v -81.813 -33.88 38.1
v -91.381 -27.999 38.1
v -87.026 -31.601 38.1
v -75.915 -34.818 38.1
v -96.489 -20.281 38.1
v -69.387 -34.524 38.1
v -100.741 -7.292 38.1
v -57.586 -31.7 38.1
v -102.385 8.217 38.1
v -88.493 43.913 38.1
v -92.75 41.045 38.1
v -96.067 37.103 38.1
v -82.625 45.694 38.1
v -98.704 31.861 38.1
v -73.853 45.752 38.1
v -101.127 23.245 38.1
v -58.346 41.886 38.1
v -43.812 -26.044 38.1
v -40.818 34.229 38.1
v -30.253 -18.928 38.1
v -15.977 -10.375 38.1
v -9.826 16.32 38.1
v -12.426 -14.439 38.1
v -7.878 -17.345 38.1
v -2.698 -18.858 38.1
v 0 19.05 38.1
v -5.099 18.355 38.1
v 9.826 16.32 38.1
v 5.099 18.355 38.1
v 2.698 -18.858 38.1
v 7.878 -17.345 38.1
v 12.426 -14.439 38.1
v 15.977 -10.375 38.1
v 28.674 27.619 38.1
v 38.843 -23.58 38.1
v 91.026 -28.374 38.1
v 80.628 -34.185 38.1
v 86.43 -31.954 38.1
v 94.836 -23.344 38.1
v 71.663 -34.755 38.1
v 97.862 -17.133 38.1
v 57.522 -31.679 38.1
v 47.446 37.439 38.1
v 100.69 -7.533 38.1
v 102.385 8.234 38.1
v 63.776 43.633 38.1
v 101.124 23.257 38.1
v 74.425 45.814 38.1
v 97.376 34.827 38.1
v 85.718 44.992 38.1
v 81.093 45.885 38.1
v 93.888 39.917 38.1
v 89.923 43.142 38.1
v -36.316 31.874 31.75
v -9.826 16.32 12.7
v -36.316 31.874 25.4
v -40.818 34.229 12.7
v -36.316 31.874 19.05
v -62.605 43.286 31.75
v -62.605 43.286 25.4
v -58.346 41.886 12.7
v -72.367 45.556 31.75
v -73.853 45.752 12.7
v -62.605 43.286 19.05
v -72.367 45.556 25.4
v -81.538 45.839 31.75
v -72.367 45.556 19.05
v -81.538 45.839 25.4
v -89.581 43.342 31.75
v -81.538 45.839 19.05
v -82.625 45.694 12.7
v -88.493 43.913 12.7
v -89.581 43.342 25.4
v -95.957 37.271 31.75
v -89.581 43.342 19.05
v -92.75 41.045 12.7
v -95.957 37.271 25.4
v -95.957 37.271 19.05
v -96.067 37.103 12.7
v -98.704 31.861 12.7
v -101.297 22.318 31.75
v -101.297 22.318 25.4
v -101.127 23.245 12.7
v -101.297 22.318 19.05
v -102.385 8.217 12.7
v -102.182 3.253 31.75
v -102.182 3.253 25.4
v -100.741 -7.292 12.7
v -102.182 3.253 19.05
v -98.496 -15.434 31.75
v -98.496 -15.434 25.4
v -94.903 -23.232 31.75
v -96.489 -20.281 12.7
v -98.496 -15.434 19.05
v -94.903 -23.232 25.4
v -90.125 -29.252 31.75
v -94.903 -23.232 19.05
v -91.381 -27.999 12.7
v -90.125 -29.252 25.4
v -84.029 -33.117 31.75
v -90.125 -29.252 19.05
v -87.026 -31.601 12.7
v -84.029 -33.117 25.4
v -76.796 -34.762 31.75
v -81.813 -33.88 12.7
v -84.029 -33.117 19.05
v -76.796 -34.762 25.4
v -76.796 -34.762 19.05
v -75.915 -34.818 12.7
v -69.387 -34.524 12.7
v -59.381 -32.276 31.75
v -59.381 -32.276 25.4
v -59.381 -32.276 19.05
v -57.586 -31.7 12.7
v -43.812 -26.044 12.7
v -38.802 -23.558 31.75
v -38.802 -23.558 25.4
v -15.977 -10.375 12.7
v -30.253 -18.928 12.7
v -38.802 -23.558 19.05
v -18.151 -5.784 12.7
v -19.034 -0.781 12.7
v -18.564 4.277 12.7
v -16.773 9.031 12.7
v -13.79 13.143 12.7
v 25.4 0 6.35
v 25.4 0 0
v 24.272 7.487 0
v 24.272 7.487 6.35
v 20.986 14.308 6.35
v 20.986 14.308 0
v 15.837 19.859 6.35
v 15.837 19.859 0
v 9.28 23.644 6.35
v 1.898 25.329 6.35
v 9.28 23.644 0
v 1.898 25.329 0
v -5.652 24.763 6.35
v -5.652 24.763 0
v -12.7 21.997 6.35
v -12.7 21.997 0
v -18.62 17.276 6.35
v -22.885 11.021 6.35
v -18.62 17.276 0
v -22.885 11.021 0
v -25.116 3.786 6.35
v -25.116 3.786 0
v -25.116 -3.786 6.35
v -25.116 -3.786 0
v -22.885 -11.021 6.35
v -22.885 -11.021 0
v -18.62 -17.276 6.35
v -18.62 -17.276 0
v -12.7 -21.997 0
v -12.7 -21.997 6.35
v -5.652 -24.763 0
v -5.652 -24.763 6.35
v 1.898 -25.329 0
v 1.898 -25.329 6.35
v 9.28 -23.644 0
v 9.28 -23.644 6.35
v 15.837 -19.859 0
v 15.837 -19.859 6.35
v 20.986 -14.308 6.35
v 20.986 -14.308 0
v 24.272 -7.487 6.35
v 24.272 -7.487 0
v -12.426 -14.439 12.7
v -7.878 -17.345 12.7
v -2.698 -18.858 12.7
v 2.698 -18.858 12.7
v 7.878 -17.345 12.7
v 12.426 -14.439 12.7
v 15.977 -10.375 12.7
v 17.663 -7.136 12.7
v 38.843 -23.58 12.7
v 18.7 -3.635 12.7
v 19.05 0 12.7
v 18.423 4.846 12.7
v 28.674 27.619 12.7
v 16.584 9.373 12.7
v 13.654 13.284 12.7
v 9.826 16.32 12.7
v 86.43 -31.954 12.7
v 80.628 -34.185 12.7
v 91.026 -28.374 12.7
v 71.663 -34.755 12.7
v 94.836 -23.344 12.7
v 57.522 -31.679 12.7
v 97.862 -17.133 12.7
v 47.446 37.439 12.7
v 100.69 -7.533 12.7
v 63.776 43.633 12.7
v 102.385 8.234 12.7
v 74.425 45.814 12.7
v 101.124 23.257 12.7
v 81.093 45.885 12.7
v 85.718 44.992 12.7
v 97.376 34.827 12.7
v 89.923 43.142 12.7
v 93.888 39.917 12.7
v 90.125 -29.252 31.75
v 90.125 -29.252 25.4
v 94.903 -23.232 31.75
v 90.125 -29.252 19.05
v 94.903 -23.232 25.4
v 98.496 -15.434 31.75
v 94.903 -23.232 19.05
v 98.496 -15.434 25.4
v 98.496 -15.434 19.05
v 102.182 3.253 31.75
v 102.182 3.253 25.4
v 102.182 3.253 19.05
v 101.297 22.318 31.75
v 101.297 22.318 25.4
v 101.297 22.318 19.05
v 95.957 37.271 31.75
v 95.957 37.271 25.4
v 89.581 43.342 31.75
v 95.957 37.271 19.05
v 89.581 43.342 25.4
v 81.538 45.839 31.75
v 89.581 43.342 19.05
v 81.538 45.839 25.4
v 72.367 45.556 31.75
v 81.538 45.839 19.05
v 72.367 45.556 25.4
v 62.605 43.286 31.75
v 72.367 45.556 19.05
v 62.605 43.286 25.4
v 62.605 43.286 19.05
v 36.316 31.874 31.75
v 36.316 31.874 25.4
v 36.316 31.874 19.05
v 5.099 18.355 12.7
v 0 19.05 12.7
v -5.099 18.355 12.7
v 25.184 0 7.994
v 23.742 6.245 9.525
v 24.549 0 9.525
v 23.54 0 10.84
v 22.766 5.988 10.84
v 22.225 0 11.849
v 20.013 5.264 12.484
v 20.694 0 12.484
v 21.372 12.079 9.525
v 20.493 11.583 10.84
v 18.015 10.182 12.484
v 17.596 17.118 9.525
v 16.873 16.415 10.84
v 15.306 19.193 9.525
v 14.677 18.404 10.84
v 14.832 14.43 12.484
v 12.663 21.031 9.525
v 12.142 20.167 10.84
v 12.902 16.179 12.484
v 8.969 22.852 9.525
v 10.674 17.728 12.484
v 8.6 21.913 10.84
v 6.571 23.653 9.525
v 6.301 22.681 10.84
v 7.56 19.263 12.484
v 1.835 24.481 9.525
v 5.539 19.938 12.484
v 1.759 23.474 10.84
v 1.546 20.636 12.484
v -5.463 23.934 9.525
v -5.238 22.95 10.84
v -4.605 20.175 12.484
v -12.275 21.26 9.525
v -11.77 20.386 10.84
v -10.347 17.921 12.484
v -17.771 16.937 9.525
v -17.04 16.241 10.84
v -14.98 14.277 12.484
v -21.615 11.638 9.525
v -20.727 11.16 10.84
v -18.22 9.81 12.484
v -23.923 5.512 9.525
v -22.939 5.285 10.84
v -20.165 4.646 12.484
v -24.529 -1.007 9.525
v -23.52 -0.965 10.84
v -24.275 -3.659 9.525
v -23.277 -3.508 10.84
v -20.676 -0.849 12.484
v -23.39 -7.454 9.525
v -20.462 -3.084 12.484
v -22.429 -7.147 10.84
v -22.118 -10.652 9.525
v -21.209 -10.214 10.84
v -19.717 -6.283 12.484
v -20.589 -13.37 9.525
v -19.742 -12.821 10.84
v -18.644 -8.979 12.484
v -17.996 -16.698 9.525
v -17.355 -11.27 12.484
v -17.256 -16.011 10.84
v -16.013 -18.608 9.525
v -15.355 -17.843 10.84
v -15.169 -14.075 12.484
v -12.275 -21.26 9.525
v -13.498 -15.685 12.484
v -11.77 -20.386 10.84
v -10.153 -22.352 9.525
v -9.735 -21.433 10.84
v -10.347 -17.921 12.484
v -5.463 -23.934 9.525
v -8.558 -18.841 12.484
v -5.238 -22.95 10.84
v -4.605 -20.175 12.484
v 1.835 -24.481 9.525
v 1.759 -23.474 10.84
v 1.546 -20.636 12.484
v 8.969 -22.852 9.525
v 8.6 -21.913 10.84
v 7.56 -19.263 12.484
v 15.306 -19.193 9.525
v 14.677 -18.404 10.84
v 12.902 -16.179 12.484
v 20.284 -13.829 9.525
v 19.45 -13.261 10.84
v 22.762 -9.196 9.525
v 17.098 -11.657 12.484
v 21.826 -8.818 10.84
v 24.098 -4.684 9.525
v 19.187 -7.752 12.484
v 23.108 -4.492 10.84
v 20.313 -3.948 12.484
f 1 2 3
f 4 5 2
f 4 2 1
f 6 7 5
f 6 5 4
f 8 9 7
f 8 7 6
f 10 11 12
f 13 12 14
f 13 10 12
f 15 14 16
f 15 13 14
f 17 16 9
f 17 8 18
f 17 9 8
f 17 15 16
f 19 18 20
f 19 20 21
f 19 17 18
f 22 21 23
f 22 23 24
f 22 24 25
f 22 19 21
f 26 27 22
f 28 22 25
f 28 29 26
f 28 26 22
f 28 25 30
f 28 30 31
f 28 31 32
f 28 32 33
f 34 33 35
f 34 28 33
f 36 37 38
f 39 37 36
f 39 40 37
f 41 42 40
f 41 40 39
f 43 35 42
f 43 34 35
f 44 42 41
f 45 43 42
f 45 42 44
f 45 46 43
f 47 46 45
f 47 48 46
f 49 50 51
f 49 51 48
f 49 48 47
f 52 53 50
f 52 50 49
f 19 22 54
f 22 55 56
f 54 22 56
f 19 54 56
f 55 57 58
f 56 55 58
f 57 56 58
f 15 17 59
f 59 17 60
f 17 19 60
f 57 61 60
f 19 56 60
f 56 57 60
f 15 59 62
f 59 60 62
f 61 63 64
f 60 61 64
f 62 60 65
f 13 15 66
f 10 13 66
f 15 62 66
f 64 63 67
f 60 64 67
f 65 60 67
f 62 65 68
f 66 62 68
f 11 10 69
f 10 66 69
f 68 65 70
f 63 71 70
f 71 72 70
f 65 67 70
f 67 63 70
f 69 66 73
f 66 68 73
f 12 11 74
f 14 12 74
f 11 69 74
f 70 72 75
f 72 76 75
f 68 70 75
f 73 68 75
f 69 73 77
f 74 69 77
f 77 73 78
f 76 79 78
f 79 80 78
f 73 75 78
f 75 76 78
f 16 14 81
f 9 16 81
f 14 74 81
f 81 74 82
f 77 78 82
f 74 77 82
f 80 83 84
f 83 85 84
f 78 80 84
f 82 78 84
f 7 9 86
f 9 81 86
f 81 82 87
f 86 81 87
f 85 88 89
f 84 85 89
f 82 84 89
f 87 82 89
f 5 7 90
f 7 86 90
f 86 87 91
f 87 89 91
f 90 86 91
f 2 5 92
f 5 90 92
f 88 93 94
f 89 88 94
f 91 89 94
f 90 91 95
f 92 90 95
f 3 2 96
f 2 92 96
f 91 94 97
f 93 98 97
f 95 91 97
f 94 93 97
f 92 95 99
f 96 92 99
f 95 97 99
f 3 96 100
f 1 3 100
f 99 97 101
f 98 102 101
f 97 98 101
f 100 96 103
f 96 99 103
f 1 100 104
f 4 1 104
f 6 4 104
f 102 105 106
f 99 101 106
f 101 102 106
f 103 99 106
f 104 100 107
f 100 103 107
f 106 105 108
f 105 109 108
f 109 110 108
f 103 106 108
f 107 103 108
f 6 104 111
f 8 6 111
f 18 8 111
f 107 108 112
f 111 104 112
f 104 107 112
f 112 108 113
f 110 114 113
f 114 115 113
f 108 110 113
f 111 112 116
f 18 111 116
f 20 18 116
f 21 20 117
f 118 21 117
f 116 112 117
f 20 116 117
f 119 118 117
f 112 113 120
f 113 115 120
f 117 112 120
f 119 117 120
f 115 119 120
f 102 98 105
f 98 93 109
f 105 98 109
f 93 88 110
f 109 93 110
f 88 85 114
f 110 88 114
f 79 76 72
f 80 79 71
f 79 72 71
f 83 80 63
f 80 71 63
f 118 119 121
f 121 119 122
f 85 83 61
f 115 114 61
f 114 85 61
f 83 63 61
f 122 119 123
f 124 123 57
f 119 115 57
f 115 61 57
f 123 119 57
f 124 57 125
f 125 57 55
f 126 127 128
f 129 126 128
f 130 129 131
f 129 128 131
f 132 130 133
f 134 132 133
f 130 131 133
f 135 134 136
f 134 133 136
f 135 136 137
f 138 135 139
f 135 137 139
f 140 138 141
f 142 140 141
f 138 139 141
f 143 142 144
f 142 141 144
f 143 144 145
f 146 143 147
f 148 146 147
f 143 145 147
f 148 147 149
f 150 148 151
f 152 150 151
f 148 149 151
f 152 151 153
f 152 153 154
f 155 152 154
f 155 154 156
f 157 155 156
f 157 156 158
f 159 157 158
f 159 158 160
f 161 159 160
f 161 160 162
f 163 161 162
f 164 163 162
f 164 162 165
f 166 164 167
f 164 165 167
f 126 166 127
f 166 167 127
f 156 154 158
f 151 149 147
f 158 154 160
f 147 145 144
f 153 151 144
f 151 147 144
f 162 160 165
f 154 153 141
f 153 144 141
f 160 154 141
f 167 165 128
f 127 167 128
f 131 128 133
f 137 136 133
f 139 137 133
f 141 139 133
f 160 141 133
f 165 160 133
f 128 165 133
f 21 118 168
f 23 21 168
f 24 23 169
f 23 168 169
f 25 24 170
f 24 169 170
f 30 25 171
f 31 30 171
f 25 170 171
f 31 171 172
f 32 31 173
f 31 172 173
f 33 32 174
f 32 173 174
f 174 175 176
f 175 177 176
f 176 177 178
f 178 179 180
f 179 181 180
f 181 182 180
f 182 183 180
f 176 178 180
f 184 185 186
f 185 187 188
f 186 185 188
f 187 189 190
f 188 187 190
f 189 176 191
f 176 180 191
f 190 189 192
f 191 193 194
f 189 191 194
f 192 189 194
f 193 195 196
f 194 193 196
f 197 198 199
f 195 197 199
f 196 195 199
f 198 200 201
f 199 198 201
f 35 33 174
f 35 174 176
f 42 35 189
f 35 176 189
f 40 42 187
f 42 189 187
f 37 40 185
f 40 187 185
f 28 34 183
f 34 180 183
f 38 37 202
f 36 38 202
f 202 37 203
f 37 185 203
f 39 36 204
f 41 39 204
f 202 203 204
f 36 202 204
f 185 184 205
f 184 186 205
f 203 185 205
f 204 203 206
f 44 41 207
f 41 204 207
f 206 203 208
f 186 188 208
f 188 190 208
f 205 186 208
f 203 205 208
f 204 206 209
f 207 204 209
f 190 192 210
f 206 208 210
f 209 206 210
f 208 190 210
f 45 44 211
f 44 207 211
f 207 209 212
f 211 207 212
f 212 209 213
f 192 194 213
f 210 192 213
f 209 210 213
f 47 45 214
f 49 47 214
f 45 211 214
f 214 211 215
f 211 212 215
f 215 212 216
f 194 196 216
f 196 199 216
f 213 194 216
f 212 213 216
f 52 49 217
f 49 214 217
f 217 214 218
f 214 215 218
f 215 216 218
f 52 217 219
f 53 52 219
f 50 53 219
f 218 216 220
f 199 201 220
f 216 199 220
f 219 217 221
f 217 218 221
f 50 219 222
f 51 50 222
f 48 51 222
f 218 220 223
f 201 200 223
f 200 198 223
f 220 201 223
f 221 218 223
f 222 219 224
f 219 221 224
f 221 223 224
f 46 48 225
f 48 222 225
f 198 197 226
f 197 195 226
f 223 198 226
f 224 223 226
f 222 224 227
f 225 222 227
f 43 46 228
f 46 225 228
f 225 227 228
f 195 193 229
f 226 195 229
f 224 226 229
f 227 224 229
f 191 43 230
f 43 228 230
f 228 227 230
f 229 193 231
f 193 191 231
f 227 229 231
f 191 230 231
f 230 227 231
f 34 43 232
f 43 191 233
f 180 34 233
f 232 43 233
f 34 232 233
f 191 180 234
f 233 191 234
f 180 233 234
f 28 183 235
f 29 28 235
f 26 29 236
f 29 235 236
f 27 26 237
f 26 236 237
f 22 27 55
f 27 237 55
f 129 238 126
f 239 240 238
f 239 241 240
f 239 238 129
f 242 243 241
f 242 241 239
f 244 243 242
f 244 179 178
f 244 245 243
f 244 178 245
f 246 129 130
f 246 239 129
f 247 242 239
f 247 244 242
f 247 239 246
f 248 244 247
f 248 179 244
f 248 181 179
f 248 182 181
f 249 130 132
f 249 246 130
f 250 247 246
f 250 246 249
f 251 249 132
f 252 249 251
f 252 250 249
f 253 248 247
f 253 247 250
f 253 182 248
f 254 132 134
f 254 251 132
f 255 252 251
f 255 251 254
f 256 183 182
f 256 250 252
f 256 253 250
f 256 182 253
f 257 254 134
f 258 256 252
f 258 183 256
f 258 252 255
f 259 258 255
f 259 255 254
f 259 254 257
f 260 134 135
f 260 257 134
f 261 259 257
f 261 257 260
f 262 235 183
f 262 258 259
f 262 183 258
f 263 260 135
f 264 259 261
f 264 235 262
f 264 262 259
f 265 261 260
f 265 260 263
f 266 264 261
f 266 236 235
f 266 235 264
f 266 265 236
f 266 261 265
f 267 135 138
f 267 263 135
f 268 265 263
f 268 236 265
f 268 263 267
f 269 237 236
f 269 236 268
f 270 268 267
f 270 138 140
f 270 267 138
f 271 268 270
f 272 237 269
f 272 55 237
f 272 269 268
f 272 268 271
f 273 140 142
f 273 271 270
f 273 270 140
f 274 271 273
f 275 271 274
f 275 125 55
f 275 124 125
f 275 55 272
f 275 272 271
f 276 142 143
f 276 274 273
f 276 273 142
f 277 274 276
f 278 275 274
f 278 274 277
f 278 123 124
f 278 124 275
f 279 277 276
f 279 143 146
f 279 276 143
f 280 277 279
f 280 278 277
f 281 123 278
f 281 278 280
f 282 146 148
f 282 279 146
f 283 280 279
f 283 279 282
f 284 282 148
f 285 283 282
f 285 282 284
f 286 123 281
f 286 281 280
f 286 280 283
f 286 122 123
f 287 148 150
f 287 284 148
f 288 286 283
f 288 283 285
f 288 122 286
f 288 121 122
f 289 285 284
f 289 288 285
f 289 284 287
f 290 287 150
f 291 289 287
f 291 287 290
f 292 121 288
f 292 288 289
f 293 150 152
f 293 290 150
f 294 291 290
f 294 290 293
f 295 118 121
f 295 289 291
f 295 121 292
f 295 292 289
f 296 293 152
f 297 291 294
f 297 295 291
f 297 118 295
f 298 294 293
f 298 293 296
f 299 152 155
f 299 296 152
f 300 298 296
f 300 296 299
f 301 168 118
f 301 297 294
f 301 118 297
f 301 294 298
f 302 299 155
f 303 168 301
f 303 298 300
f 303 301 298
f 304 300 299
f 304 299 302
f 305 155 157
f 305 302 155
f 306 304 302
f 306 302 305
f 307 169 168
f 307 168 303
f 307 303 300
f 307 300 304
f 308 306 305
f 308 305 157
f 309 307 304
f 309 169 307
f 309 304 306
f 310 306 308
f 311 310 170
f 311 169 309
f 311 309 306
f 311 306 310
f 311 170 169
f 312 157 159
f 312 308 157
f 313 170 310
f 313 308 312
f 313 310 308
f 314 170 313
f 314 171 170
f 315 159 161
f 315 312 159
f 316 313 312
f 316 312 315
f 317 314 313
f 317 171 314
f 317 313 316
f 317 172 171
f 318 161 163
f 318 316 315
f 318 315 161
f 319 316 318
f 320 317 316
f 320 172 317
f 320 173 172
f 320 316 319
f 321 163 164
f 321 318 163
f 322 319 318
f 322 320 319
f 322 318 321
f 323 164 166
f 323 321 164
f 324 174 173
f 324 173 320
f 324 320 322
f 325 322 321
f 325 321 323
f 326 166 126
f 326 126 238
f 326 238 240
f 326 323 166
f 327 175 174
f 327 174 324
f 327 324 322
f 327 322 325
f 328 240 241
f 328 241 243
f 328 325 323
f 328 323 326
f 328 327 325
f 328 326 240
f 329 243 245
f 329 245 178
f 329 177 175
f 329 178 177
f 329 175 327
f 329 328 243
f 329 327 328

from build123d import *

# Parameters (mm, degrees)
F0_R     = 25.4
F1_DEPTH = 12.7
F2_R     = 6.35
F4_DEPTH = 25.4


with BuildPart() as f1:
    # F0 (on Top) → F1 (new body)
    with BuildSketch(Plane.XY):
        Circle(F0_R)
    extrude(amount=F1_DEPTH)

    # F2
    f2_edges = [f1.edges().sort_by_distance(p)[0] for p in [
        (-25.4, 0, 12.7),
    ]]
    fillet(f2_edges, radius=F2_R)

    # F3 (on face) → F4 (join)
    with BuildSketch(Plane.XY.offset(12.7)):
        with BuildLine():
            ThreePointArc((15.9767099151, -10.3753188042), (18.2655252304, -5.4104609839), (19.05, 0))
            ThreePointArc((19.05, 0), (16.5844776781, 9.3732385089), (9.8261049717, 16.3202377766))
            ThreePointArc((9.8261049717, 16.3202377766), (0, 19.05), (-9.8261049717, 16.3202377766))
            ThreePointArc((-9.8261049717, 16.3202377766), (-18.5636607195, 4.2770317616), (-15.9767099151, -10.3753188042))
            add(Edge.make_bspline(
                [(-15.9767099151, -10.3753188042), (-10.733833245, -7.0871349658), (-5.3932086394, -3.5998040782), (0, 0)],
                knots=[0.9558270174, 0.9558270174, 0.9558270174, 0.9558270174, 1, 1, 1, 1], degree=3))
            add(Edge.make_bspline(
                [(15.9767099151, -10.3753188042), (10.733833245, -7.0871349658), (5.3932086394, -3.5998040782), (0, 0)],
                knots=[0.9558270174, 0.9558270174, 0.9558270174, 0.9558270174, 1, 1, 1, 1], degree=3))
        make_face()
        with BuildLine():
            ThreePointArc((9.8261049717, 16.3202377766), (16.5844776781, 9.3732385089), (19.05, 0))
            ThreePointArc((19.05, 0), (18.2655252304, -5.4104609839), (15.9767099151, -10.3753188042))
            add(Edge.make_bspline(
                [(9.8261049717, 16.3202377766), (27.5133129115, 27.1332712353), (58.5484608841, 46.2094911101), (107.0925459928, 49.2422955372), (102.8890607811, -55.0234025928), (47.4976243758, -30.1443440976), (15.9767099151, -10.3753188042)],
                knots=[0, 0, 0, 0, 0.2449740985, 0.4302204371, 0.6902528121, 0.9558270174, 0.9558270174, 0.9558270174, 0.9558270174], degree=3))
        make_face()
        with BuildLine():
            ThreePointArc((-15.9767099151, -10.3753188042), (0, -19.05), (15.9767099151, -10.3753188042))
            add(Edge.make_bspline(
                [(15.9767099151, -10.3753188042), (10.733833245, -7.0871349658), (5.3932086394, -3.5998040782), (0, 0)],
                knots=[0.9558270174, 0.9558270174, 0.9558270174, 0.9558270174, 1, 1, 1, 1], degree=3))
            add(Edge.make_bspline(
                [(-15.9767099151, -10.3753188042), (-10.733833245, -7.0871349658), (-5.3932086394, -3.5998040782), (0, 0)],
                knots=[0.9558270174, 0.9558270174, 0.9558270174, 0.9558270174, 1, 1, 1, 1], degree=3))
        make_face()
        with BuildLine():
            ThreePointArc((-15.9767099151, -10.3753188042), (-18.5636607195, 4.2770317616), (-9.8261049717, 16.3202377766))
            add(Edge.make_bspline(
                [(-9.8261049717, 16.3202377766), (-27.5133129115, 27.1332712353), (-58.5484608841, 46.2094911101), (-107.0925459928, 49.2422955372), (-102.8890607811, -55.0234025928), (-47.4976243758, -30.1443440976), (-15.9767099151, -10.3753188042)],
                knots=[0, 0, 0, 0, 0.2449740985, 0.4302204371, 0.6902528121, 0.9558270174, 0.9558270174, 0.9558270174, 0.9558270174], degree=3))
        make_face()
    extrude(amount=F4_DEPTH)


solid = f1.part
